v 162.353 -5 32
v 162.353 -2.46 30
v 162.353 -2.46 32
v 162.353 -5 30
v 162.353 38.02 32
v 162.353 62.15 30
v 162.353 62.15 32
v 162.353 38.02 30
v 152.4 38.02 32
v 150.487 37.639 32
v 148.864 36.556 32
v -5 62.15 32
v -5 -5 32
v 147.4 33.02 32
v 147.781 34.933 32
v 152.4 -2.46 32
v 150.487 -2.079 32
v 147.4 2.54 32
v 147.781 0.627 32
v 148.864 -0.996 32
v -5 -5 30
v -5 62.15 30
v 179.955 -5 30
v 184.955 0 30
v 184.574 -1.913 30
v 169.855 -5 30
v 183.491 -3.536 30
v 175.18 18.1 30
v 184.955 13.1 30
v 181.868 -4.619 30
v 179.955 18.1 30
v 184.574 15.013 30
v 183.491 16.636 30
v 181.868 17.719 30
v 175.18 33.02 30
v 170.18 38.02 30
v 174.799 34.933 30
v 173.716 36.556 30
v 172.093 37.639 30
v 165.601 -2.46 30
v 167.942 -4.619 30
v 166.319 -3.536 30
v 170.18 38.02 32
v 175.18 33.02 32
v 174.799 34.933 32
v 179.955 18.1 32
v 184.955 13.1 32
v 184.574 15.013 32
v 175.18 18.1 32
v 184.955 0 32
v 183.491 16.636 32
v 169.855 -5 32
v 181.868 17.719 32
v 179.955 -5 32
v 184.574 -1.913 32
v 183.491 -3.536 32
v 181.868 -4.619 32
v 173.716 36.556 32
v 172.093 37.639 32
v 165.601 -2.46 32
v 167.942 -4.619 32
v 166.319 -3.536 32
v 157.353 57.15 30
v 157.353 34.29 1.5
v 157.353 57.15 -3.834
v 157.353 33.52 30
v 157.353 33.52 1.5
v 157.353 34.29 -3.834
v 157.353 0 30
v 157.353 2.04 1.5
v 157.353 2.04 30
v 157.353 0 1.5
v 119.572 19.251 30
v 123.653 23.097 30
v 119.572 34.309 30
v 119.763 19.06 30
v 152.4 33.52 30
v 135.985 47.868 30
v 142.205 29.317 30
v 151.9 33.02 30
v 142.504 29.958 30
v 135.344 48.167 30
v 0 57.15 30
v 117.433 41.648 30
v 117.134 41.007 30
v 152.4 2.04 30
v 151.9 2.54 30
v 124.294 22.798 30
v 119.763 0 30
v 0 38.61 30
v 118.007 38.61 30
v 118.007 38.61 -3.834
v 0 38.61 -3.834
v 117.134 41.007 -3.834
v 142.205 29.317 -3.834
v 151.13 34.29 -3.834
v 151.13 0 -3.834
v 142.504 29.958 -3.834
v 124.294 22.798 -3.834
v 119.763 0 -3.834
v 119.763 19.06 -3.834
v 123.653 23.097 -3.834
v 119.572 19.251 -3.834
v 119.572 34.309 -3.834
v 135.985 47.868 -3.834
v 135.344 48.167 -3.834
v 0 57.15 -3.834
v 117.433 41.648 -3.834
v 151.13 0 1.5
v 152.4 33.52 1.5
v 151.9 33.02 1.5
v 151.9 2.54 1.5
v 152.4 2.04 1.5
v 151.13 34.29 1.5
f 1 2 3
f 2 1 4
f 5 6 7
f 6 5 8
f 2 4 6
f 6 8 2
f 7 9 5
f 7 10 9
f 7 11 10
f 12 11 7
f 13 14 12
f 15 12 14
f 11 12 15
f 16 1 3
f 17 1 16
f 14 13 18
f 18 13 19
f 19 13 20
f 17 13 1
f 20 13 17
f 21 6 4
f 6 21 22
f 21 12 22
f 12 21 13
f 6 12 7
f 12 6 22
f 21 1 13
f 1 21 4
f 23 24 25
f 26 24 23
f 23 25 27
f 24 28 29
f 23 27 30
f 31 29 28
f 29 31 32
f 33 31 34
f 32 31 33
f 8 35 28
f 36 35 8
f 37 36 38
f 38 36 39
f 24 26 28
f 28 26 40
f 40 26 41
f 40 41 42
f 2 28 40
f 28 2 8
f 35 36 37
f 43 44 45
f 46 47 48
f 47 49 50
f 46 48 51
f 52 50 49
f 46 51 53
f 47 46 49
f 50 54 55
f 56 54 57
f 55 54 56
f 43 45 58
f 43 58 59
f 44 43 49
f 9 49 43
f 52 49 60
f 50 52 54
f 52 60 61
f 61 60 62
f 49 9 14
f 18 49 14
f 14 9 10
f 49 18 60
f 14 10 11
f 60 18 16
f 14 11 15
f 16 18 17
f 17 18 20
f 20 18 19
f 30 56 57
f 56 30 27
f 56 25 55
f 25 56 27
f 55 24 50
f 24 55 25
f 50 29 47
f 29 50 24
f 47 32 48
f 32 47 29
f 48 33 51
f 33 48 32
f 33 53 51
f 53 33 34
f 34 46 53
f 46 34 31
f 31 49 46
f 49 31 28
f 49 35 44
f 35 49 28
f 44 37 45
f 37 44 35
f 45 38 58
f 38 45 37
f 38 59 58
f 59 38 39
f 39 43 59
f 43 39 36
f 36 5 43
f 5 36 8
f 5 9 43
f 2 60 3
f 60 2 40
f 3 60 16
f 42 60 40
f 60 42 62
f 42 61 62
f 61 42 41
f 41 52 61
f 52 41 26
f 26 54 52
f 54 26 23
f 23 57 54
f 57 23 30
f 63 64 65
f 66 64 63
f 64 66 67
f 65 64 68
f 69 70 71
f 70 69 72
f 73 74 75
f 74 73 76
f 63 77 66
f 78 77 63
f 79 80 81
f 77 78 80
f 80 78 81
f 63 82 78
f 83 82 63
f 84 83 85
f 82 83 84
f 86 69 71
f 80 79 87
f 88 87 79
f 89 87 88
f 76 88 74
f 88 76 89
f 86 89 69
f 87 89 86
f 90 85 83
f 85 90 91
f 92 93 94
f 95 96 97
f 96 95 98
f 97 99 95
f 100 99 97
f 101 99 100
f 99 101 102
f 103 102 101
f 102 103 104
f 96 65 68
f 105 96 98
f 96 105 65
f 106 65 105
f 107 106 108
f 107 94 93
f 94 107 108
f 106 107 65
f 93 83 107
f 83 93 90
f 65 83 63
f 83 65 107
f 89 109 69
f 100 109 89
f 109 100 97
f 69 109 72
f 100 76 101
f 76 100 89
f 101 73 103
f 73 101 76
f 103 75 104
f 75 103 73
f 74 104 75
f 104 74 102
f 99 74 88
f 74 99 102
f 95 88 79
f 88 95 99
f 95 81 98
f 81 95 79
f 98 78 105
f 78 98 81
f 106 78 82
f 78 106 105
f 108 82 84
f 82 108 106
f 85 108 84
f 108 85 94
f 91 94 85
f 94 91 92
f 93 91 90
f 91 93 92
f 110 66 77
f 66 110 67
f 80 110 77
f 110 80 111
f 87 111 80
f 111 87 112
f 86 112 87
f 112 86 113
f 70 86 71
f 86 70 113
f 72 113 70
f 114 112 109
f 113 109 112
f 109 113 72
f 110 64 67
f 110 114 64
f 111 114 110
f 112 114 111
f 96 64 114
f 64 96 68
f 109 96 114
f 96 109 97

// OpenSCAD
// file: ../../../lib/circuits/helpers.scad
function bu(u) = u * 2.54;

module breadboard_row(number, orientation="vertical") {
  children();
  if(number > 1) {
    if(orientation == "vertical") {
      translate([0,bu(1),0])
        breadboard_row(number-1, orientation=orientation) {
          children();
        }
    } else {
      translate([bu(1),0,0])
        breadboard_row(number-1, orientation=orientation){
          children();
        }
    }
  }
}
// file: ../../../lib/switches/rgb.scad
include <../variables.scad>

module rgb_row_trace_connection(width, height, xpos, ypos, rgb, connections) {
  half_width = u_mm(width)/2;
  half_height = u_mm(height)/2;
  if(connections[3] == "connect") {
    translate([1-half_width,8.875,0]){
      circle(d=0.8,$fn=40);
      offset(0.4)
        polygon(points=[[0,-0.01],[0,0.01],[u_mm(-xpos)-2, u_mm(-ypos)+0.01],[u_mm(-xpos)-2, u_mm(-ypos)-0.01]]);
    }
    translate([1-half_width,4.9,0]){
      circle(d=0.8,$fn=40);
      offset(0.4)
        polygon(points=[[0,-0.01],[0,0.01],[u_mm(-xpos)-2, u_mm(-ypos)+0.01],[u_mm(-xpos)-2, u_mm(-ypos)-0.01]]);
    }
    translate([1-half_width,3.3,0]){
      circle(d=0.8,$fn=40);
      offset(0.4)
        polygon(points=[[0,-0.01],[0,0.01],[u_mm(-xpos)-2, u_mm(-ypos)+0.01],[u_mm(-xpos)-2, u_mm(-ypos)-0.01]]);
    }
  }
  if(connections[2] == "connect") {
    translate([half_width-1,8.875,0]) {
      circle(d=0.8,$fn=40);
    }
    translate([half_width-1,4.9,0]) {
      circle(d=0.8,$fn=40);
    }
    translate([half_width-1,3.3,0]){
      circle(d=0.8,$fn=40);
    }
  }
}

module rgb_pcb_drill(width=1, height=1, rgb=true, connections=["hole","hole","hole","hole"]) {
  half_width = u_mm(width)/2;
  half_height = u_mm(height)/2;
  translate([half_width,half_height,0]) {
    if(rgb == true) {
      // LED Hole
      translate([-1.875,3.4])
        square([3.75,3]);

      // LED D
      if(connections[3] == "hole")
        translate([1.3-half_width,8,0])
          circle(d=1,$fn=40);
      if(connections[2] == "hole")
        translate([half_width-1.3,8,0])
          circle(d=1,$fn=40);

      // LED G
      if(connections[3] == "hole")
        translate([1.3-half_width,5.4,0])
          circle(d=1,$fn=40);
      if(connections[2] == "hole")
        translate([half_width-1.3,5.4,0])
          circle(d=1,$fn=40);

      // LED V
      if(connections[3] == "hole")
        translate([1.3-half_width,2.8,0])
          circle(d=1,$fn=40);
      if(connections[2] == "hole")
        translate([half_width-1.3,2.8,0])
          circle(d=1,$fn=40);
    }

    children();
  }
}

module rgb_pcb_hole_traces(width=1, height=1, rgb=true, xpos=0, ypos=0, connections=["hole","hole","hole","hole"]) {
  half_width = u_mm(width)/2;
  half_height = u_mm(height)/2;
  translate([half_width,half_height,0]) {
    if(rgb == true) {
      // LED D
      if(connections[3] == "hole")
        translate([1.3-half_width,8,0])
          circle(d=2.5,$fn=40);
      if(connections[2] == "hole")
        translate([half_width-1.3,8,0])
          circle(d=2.5,$fn=40);

      // LED G
      if(connections[3] == "hole")
        translate([1.3-half_width,5.4,0])
          circle(d=2.5,$fn=40);
      if(connections[2] == "hole")
        translate([half_width-1.3,5.4,0])
          circle(d=2.5,$fn=40);

      // LED V
      if(connections[3] == "hole")
        translate([1.3-half_width,2.8,0])
          circle(d=2.5,$fn=40);
      if(connections[2] == "hole")
        translate([half_width-1.3,2.8,0])
          circle(d=2.5,$fn=40);
    }

    children();
  }
}

module rgb_pcb_traces(width=1, height=1, rgb=true, xpos=0, ypos=0, connections=["hole","hole","hole","hole"]) {
  half_width = u_mm(width)/2;
  half_height = u_mm(height)/2;
  rgb_pcb_hole_traces(width=width, height=height, rgb=rgb, connections=connections) {
    if(rgb == true) {
      rgb_row_trace_connection(width=width, height=height, xpos=xpos, ypos=ypos, rgb=rgb, connections=connections);
      v_left = connections[3] == "none" ? 1 : half_width-5;
      // LED G
      translate([1.25,5])
        square([2,2]);
      translate([2.7,8.5,0]) {
        length = connections[2] == "none" ? 2 : half_width-3.7; 
        square([length,0.75]);
      }
      translate([2.7,6.8])
        square([0.8,2.4]);
      translate([-3.5,6.2])
        square([7,0.8]);
      translate([-3.5,6.8])
        square([0.8,2.4]);
      translate([-4-v_left,8.5,0])
        square([v_left+1,0.75]);

      // LED D
      translate([-4-v_left,4.5,0])
        square([v_left,0.8]);
      translate([-4.5,4.5,0])
        square([0.8,1.3]);
      translate([-4.5,5,0])
        square([1.3,0.8]);
      translate([2,4,0])
        square([2,0.8]);
      translate([4,4,0])
        square([0.8,1.3]);
      translate([4,4.5,0]) {
        length = connections[2] == "none" ? 0 : half_width-5; 
        square([length,0.75]);
      }
      translate([-3.375,5])
        square([2,1.1]);
      translate([1.25,3.75])
        square([2,1.1]);

      // LED V
      v_right = connections[2] == "none" ? 0 : half_width-5.25;
      translate([-4-v_left,2.9,0])
        square([v_right+v_left+8.875,0.8]);
      translate([-3.375,3.5])
        square([2,1.35]);
    }

    children();
  }
}
// file: ../../../lib/switches/base.scad
include <../variables.scad>
include <rgb.scad>

// ["top", "bottom", "left", "right"]

module switch_row_trace_connection(width, height, xpos, ypos, rgb, connections) {
  half_width = u_mm(width)/2;
  half_height = u_mm(height)/2;
  if(connections[3] == "connect") {
    translate([1-half_width,-5.5,0]){
      circle(d=0.8,$fn=40);
      offset(0.4)
        polygon(points=[[0,-0.01],[0,0.01],[u_mm(-xpos)-2, u_mm(-ypos)+0.01],[u_mm(-xpos)-2, u_mm(-ypos)-0.01]]);
    }
  }
  if(connections[2] == "connect") {
    translate([half_width-1,-5.5,0]) {
      circle(d=0.8,$fn=40);
    }
  }
}

module switch_column_trace_connection(width, height, xpos, ypos, rgb, connections, last_xpos=0, last_ypos=0) {
  half_width = u_mm(width)/2;
  half_height = u_mm(height)/2;
  if(connections[1] == "connect") {
    translate([-u_mm((width-1)/2)-0.9,half_height-1,0]) {
      circle(d=0.8,$fn=40);
      offset(0.4)
        polygon(points=[[0,-0.01],[0,0.01],[u_mm((width-1)/2),0.01],[u_mm((width-1)/2),-0.01]]);
    }
  }
  if(connections[0] == "connect") {
    y_off = u_mm(ypos-last_ypos);
    x_off = u_mm(last_xpos-xpos);
    translate([-0.875,-1-y_off-half_height,0]) {
      offset(0.4)
        polygon(points=[[-0.01+x_off,0],[0.01+x_off,0],[0.01,2+y_off],[-0.01,2+y_off]]);
      translate([x_off-0.01,0]) {
        offset(0.4)
          polygon(points=[[0,-0.01],[0,0.01],[u_mm((width-1)/2)+1,0.01],[u_mm((width-1)/2)+1,-0.01]]);
      }
    }
  }
}

module switch_base_pcb_drill(width=1, height=1, rgb=true, single=true, connections=["hole","hole","hole","hole"]) {
  half_width = u_mm(width)/2;
  half_height = u_mm(height)/2;
  rgb_pcb_drill(width=width, height=height, rgb=rgb, connections=connections) {
    // Row
    if(connections[2] == "hole")
      translate([half_width-1.3,-5.5,0])
        circle(d=1,$fn=40);
    if(connections[3] == "hole")
      translate([1.3-half_width,-5.5,0])
        circle(d=1,$fn=40);

    // Column
    if(connections[1] == "hole")
      translate([-1,half_height-1.25,0])
        circle(d=1,$fn=40);
    if(connections[0] == "hole")
      translate([-1,1.25-half_height,0])
        circle(d=1,$fn=40);

    children();
  }
}

module switch_base_pcb_traces(width=1, height=1, rgb=true, xpos=0, ypos=0, connections=["hole","hole","hole","hole"], last_xpos=0, last_ypos=0, single=true) {
  half_width = u_mm(width)/2;
  half_height = u_mm(height)/2;
  rgb_pcb_traces(width=width, height=height, rgb=rgb, xpos=xpos, ypos=ypos, connections=connections) {
    switch_row_trace_connection(width, height, xpos, ypos, rgb, connections);
    if(single && !rgb)
      switch_column_trace_connection(width, height, xpos, ypos, rgb, connections, last_xpos=last_xpos, last_ypos=last_ypos);

    // Row
    if(connections[2] == "hole")
      translate([half_width-1.3,-5.5,0])
        circle(d=2.5,$fn=40);
    if(connections[3] == "hole")
      translate([1.3-half_width,-5.5,0])
        circle(d=2.5,$fn=40);

    // Column
    if(connections[1] == "hole")
      translate([-1,half_height-1.25,0])
        circle(d=2.4,$fn=40);
    if(connections[0] == "hole")
      translate([-1,1.25-half_height,0])
        circle(d=2.4,$fn=40);

    children();
  }
}

module switch_base_pcb_traces_bottom(width=1, height=1, rgb=true, xpos=0, ypos=0, connections=["hole","hole","hole","hole"], last_xpos=0, last_ypos=0) {
  half_width = u_mm(width)/2;
  half_height = u_mm(height)/2;
  rgb_pcb_hole_traces(width=width, height=height, rgb=rgb, connections=connections) {
    switch_column_trace_connection(width, height, xpos, ypos, rgb, connections, last_xpos=last_xpos, last_ypos=last_ypos);

    // Row
    if(connections[2] == "hole")
      translate([half_width-1.3,-5.5,0])
        circle(d=2.5,$fn=40);
    if(connections[3] == "hole")
      translate([1.3-half_width,-5.5,0])
        circle(d=2.5,$fn=40);

    // Column
    if(connections[1] == "hole")
      translate([-1,half_height-1.25,0])
        circle(d=2.5,$fn=40);
    if(connections[0] == "hole")
      translate([-1,1.25-half_height,0])
        circle(d=2.5,$fn=40);

    children();
  }
}
// file: ../../../lib/switches/footprints.scad
include <../variables.scad>
include <stabilizers.scad>

module pcb_switch_outline(width=1, height=1) {
  stab_extra = width >= 2 ? 2 : 0;
  translate([0,-stab_extra])
    square([u_mm(width)+0.01, u_mm(height)+0.01+stab_extra]);
}

module pcb_switch_space_outline(width=1, height=1, style="mx", cnc=false) {
  offset = height_for_style(style);
  stab_extra = width >= 2 ? 2 : 0;
  translate([-1,-1-stab_extra,2.834-offset])
    cube([u_mm(width) + 2, u_mm(height) + 2 + stab_extra, 1.166+offset]);
  translate([u_mm(width/2),u_mm(height/2)]) {
    translate([-7.5,-7.5,1.5-offset])
      cube([15,15,5]);
    translate([-7,-7,-10])
      cube([14,14,10]);
    translate([u_mm(-width/2)-0.5,u_mm(-height/2)-0.5,-20-offset])
      cube([u_mm(width)+1,u_mm(height)+1, 20]);
  }
  translate([hole_offset(width), hole_offset(height),-10])
    stab(width);
}
// file: ../../../lib/switches/stabilizers.scad
module stab_hole_render(distance){
  translate([14+distance+3.375,6.99,0]) {
    circle(d=3.175, $fn=40);
    translate([0,-15.24,0])
      circle(d=4.064, $fn=40);
  }
  translate([-6.75-distance+3.375,6.99,0]) {
    circle(d=3.175, $fn=40);
    translate([0,-15.24,0])
      circle(d=4.064, $fn=40);
  }
}

module stab_holes(width) {
  if (width >= 7) {
    stab_hole_render(39.6);
  } else if (width >= 6) {
    stab_hole_render(39.6);
  } else if(width >= 2) {
    stab_hole_render(1.6);
  }
}

module stab_render(distance, cnc=false, height=5.334) {
  translate([14+distance,1.47,0]){
    // Right Side Large Hole
    cube([6.75,12.3,10]);

    // Add 1/16" corner holes for milling
    if(cnc){
      translate([0.56,0.56,0])
        cylinder(h=10,d=1.59,$fn=20);
      translate([6.75-0.56,0.56,0])
        cylinder(h=10,d=1.59,$fn=20);
      translate([0.56,12.3-0.56,0])
        cylinder(h=10,d=1.59,$fn=20);
      translate([6.75-0.56,12.3-0.56,0])
        cylinder(h=10,d=1.59,$fn=20);
    }
    translate([5.75,3.23,0]){
      // Side hole for notch
      cube([1.825,3.175,10]);
      translate([1.825,1.59,0])
        if(cnc)
          resize([1.59,3.175,10])
            cylinder(h=10,d=1.59,$fn=20);
    }
    translate([1.725,11.3,0]){
      // Top Notch
      cube([3.3,2.2,10]);
      if(cnc)
        translate([1.65,2.2,0])
          resize([3.3,1,10])
            cylinder(h=10,d=1,$fn=20);
    }
    // Thin out for clip
    translate([-1,-1,10-height+1.5])
      cube([8.75,14.3,height-1.5]);
  }
  translate([-6.75-distance,1.47,0]){
    // Left Side Large Hole
    cube([6.75,12.3,10]);
    translate([-0.825,3.23,0]){
      // Side hole for notch
      cube([1.825,3.175,10]);
      if(cnc)
        translate([0,1.59,0])
          resize([1.59,3.175,10])
            cylinder(h=10,d=1.59,$fn=20);

    }
    translate([1.725,11.3,0]){
      // Top Notch
      cube([3.3,2.2,10]);
      if(cnc)
        translate([1.65,2.2,0])
          resize([3.3,1,10])
            cylinder(h=10,d=1,$fn=20);
    }
    if(cnc){
      translate([0.56,0.56,0])
        cylinder(h=10,d=1.59,$fn=20);
      translate([6.75-0.56,0.56,0])
        cylinder(h=10,d=1.59,$fn=20);
      translate([0.56,12.3-0.56,0])
        cylinder(h=10,d=1.59,$fn=20);
      translate([6.75-0.56,12.3-0.56,0])
        cylinder(h=10,d=1.59,$fn=20);
    }
    // Thin out for clip
    translate([-1,-1,10-height+1.5])
      cube([8.75,14.3,height-1.5]);
  }
  // Center shaft for bar
  translate([-distance-2,4.7,0]){
    cube([distance*2+20,4.6,10]);
  }
}

module stab(key_width, cnc=false) {
  if (key_width >= 7) {
    stab_render(39.6, cnc=cnc);
  } else if (key_width >= 6) {
    stab_render(39.6, cnc=cnc);
  } else if(key_width >= 2) {
    stab_render(1.6, cnc=cnc);
  }
}
// file: ../../../lib/circuits/wire.scad
module guage(guage=12) {
  fn=20;
  if(guage == 8) {
    circle(d=3.25, $fn=fn);
  } else if (guage == 10) {
    circle(d=2.59, $fn=fn);
  } else if (guage == 12) {
    circle(d=2.06, $fn=fn);
  } else if (guage == 14) {
    circle(d=1.57, $fn=fn);
  } else if (guage == 16) {
    circle(d=1.3, $fn=fn);
  }
}

module wire_pcb_drill(guage=12) {
  offset(0.1)
    guage(guage);
}

module wire_pcb_traces(guage=12) {
  offset(0.75)
    guage(guage);
}

module wire_pcb_outline(guage=12) {
  offset(1.5)
    guage(guage);
}

module wire_space_outline(guage=12) {
  linear_extrude(10)
    offset(0.1)
      guage(guage);
}
// file: ../../../lib/circuits/trrs.scad
module trrs_post(d=1.2) {
  translate([0,-d/4,0]) {
    circle(d=d, $fn=20);
    translate([-d/2,0,0]) {
      square([d,(d/2-.2)]);
    }
    translate([0,(d/2-.2),0]) {
      circle(d=d, $fn=20);
    }
  }
}

module trrs_pcb_drill(side="left") {
  translate([2.8,1.5]) {
    circle(d=2, $fn=20);
  }
  translate([2.8,8.5]) {
    circle(d=2, $fn=20);
  }
  translate([0.5,11.3,0]) {
    trrs_post();
  }
  translate([5.1,3.2,0]) {
    trrs_post();
  }
  translate([5.1,6.2,0]) {
    trrs_post();
  }
  translate([5.1,10.2,0]) {
    trrs_post();
  }
  if(side != "none"){
    offset = side == "left" ? 7.6 : -2;
    translate([offset,11.3]) {
      circle(d=1.2, $fn=20);
    }
    translate([offset,8.3]) {
      circle(d=1.2, $fn=20);
    }
    translate([offset,5.3]) {
      circle(d=1.2, $fn=20);
    }
    translate([offset,2.2]) {
      circle(d=1.2, $fn=20);
    }
  }
}

module trrs_pcb_traces(side="left") {
  translate([-1,9.7,0]){
    difference() {
      square([3,3]);
      if(side == "right") {
        translate([3,-1.8]) {
          rotate(45) {
            square(2);
          }
        }
      }
    }
  }
  translate([3.6,1.2,0]){
    difference() {
      square([3,3.5]);
      if(side == "left") {
        translate([3,2.3]) {
          rotate(45) {
            square(2);
          }
        }
      }
    }
  }
  translate([3.6,4.8,0]){
    difference() {
        square([3,3.5]);
        if(side == "left") {
          translate([3,2.3]) {
            rotate(45) {
              square(2);
            }
          }
        }
    }
  }
  translate([3.6,8.4,0]){
    difference() {
      square([3,3.2]);
      if(side == "left") {
        translate([3,1.8]) {
          rotate(45) {
            square(2);
          }
        }
      }
    }
  }
  if(side != "none"){
    translate([side == "left" ? 7.6 : -2,0,0]){
      translate([0,11.3]) {
        circle(d=3, $fn=20);
      }
      translate([0,8.3]) {
        circle(d=2.9, $fn=20);
      }
      translate([0,5.3]) {
        circle(d=3, $fn=20);
      }
      translate([0,2.2]) {
        circle(d=3, $fn=20);
      }
    }
    translate([side == "left" ? 5.6 : -2,0,0]){
      left_trace = side == "left" ? 2.5 : 7.6;
      translate([0,2.2]) {
        square([left_trace,1.5]);
      }
      translate([0,5.1]) {
        square([left_trace,1.5]);
      }
      if(side == "left") {
        translate([0,8.7]) {
          square([left_trace,0.9]);
        }
      }
      else {
        translate([0,8]) {
          square([4,1.6]);
        }
        translate([4,9]) {
          square([4,1.6]);
        }
        translate([2.8,9.4]) {
          rotate(-45) {
            square([1,1.7]);
          }
        }
      }
    }
    translate([side == "left" ? 0.5 : -2,0,0]){
      right_trace = side == "left" ? 7.1 : 2;
      translate([0,11.7]) {
        square([right_trace,1.3]);
      }
      translate([0,12]) {
        circle(1, $fn=20);
      }
      translate([right_trace,11.8]) {
        circle(1, $fn=20);
      }
    }
  }
}

module trrs_pcb_outline(side="left") {
  translate([-1,0,0]) {
    square([7.6,13.1]);
  }
  if(side != "none"){
    translate([side == "left" ? 5.6 : -3.5, 0]) {
      square([4,13.1]);
    }
  }
}

module trrs_space_outline(side="left") {
  translate([0,0,-5.3]) {
    linear_extrude(7){
      translate([-2,-1,0])
        square([9.6,15.1]);
      translate([0,-12.1,0])
        square([5.6,12.1]);
      if(side != "none")
        translate([side == "left" ? 5.6 : -4.5, -1])
          square([5,15.1]);
    }
  }
  translate([3,-2,-2.6]) {
    rotate([90,0,0]) {
      cylinder(d=10, h=30, $fn=100);
    }
  }
}
// file: ../../../lib/circuits/trace.scad
function vdef(vector, index) = len(vector) == index ? vector[index-1] : vector[index];
function vadd(vector, index, axis) = vdef(vector, index)[axis] > vdef(vector, index-1)[axis] ? 0.01 : -0.01;
function polygon_from_vector(vector) = 
  len(vector) > 0 ?
    concat(vector, 
      [for (i = [1:len(vector)]) 
        [vector[len(vector)-i][0]-vadd(vector, i, 0),vector[len(vector)-i][1]-vadd(vector, i, 1)]])
      : [];

function parse_loc(loc) = [
  loc[5],
  len(loc) < 7 ? "both" : loc[6],
  len(loc) < 8 ? "none" : loc[7],
];

module manual_trace_pcb_drill(location) {
  vector = parse_loc(location)[0];
  echo("holes", parse_loc(location)[2]);
  if(parse_loc(location)[2] == "holes" || parse_loc(location)[2] == "hole_begin") {
    translate(vector[0]) {
      circle(d=1, $fn=20);
    }
  }
  if(parse_loc(location)[2] == "holes" || parse_loc(location)[2] == "hole_end") {
    translate(vector[len(vector)-1]) {
      circle(d=1, $fn=20);
    }
  }
}

module manual_trace_pcb_traces(location) {
  vector = parse_loc(location)[0];
  if(parse_loc(location)[1] != "bottom") {
    offset(0.4) {
      polygon(points=polygon_from_vector(vector));
    }
  }
  if(parse_loc(location)[2] == "holes" || parse_loc(location)[2] == "hole_begin") {
    translate(vector[0]) {
      circle(d=2.5, $fn=20);
    }
  }
  if(parse_loc(location)[2] == "holes" || parse_loc(location)[2] == "hole_end") {
    translate(vector[len(vector)-1]) {
      circle(d=2.5, $fn=20);
    }
  }
}

module manual_trace_pcb_traces_bottom(location) {
  vector = parse_loc(location)[0];
  if(parse_loc(location)[1] != "top") {
    offset(0.4) {
      polygon(points=polygon_from_vector(vector));
    }
  }
  if(parse_loc(location)[2] == "holes" || parse_loc(location)[2] == "hole_begin") {
    translate(vector[0]) {
      circle(d=2.5, $fn=20);
    }
  }
  if(parse_loc(location)[2] == "holes" || parse_loc(location)[2] == "hole_end") {
    translate(vector[len(vector)-1]) {
      circle(d=2.5, $fn=20);
    }
  }
}

module manual_trace_pcb_outline(location) {
  vector = parse_loc(location)[0];
  echo("location", location);
  offset(1)
    polygon(points=polygon_from_vector(vector));

  if(parse_loc(location)[2] == "holes" || parse_loc(location)[2] == "hole_begin") {
    translate(vector[0]) {
      circle(d=4, $fn=20);
    }
  }
  if(parse_loc(location)[2] == "holes" || parse_loc(location)[2] == "hole_end") {
    translate(vector[len(vector)-1]) {
      circle(d=4, $fn=20);
    }
  }
}

module manual_trace_space_outline(location) {
  vector = parse_loc(location)[0];
  translate([0,0,-1])
    linear_extrude(2)
      offset(0.5)
        manual_trace_pcb_outline(vector);
}
// file: ../../../lib/circuits/support.scad
module support_pcb_drill(mm=2) {
  offset(0.1)
    circle(d=mm, $fn=20);
}

module support_pcb_traces(mm=2) {
}

module support_pcb_outline(mm=2) {
  offset(2)
    circle(d=mm, $fn=20);
}

module support_space_outline(mm=2) {
  linear_extrude(10)
    offset(0.1)
      circle(d=mm, $fn=20);
}
// file: ../../../lib/circuits/proton_c.scad
use <helpers.scad>

module proton_c_pcb_drill(size="full") {
  translate([bu(0.5),bu(1.5),0]) {
    translate([0,bu(1)])
      breadboard_row(4, "horizontal"){
        circle(d=1, $fn=20);
        translate([0,bu(1)])
          circle(d=1, $fn=20);
      }
    translate([bu(4),bu(1)])
      breadboard_row(2)
        circle(d=1, $fn=20);
    translate([bu(4),bu(3)])
      breadboard_row(2)
        circle(d=1, $fn=20);
    circle(d=1, $fn=20);
    translate([bu(1),0,0])
      circle(d=1, $fn=20);
    translate([bu(5),0,0])
      circle(d=1, $fn=20);
    translate([bu(6),0,0])
      circle(d=1, $fn=20);
    breadboard_row(12) {
      circle(d=1, $fn=20);
      translate([bu(1),0,0])
        circle(d=1, $fn=20);
      translate([bu(5),0,0])
        circle(d=1, $fn=20);
      translate([bu(6),0,0])
        circle(d=1, $fn=20);
    }
    if(size == "full")
      translate([0,bu(13)])
        breadboard_row(6) {
          circle(d=1, $fn=20);
          translate([bu(1),0,0])
            circle(d=1, $fn=20);
          translate([bu(5),0,0])
            circle(d=1, $fn=20);
          translate([bu(6),0,0])
            circle(d=1, $fn=20);
    }
  }
}

module proton_c_pcb_traces(size="full") {
  translate([bu(0.5),bu(1.5),0]) {
    translate([0,bu(1)])
      breadboard_row(4, "horizontal"){
        circle(d=2.4, $fn=20);
        translate([-1,0])
          square([2,bu(1)]);
        translate([0,bu(1)])
          circle(d=2.4, $fn=20);
      }
    translate([0,bu(1)])
      breadboard_row(2) {
        translate([bu(5),0])
          circle(d=2.4, $fn=20);
        translate([bu(5),-1,0])
          square([bu(1),2]);
        translate([bu(6),0,0])
          circle(d=2.4, $fn=20);
      }
    translate([bu(4),bu(1)]){
      translate([-0.75,-1])
        square([1.5,bu(2)-2]);
      breadboard_row(2)
        circle(d=2.4, $fn=20);
      translate([0,-0.75])
        square([bu(2),1.5]);
    }
    translate([bu(4),bu(3)]){
      translate([-0.75,-1])
        square([1.5,bu(2)-2]);
      breadboard_row(2)
        circle(d=2.4, $fn=20);
      translate([0,-0.75])
        square([bu(2),1.5]);
    }
    circle(d=2.4, $fn=20);
    translate([0,-1,0])
      square([bu(1),2]);
    translate([bu(1),0,0])
      circle(d=2.4, $fn=20);
    translate([bu(5),0])
      circle(d=2.4, $fn=20);
    translate([bu(5),-1,0])
      square([bu(1),2]);
    translate([bu(6),0,0])
      circle(d=2.4, $fn=20);
    translate([0,bu(3)])
      breadboard_row(9) {
        circle(d=2.4, $fn=20);
        translate([0,-1,0])
          square([bu(1),2]);
        translate([bu(1),0,0])
          circle(d=2.4, $fn=20);
        translate([bu(5),0])
          circle(d=2.4, $fn=20);
        translate([bu(5),-1,0])
          square([bu(1),2]);
        translate([bu(6),0,0])
          circle(d=2.4, $fn=20);
      }
    if(size == "full")
      translate([0,bu(13)])
        breadboard_row(6) {
          circle(d=2.4, $fn=20);
          translate([0,-1,0])
            square([bu(1),2]);
          translate([bu(1),0,0])
            circle(d=2.4, $fn=20);
          translate([bu(5),0])
            circle(d=2.4, $fn=20);
          translate([bu(5),-1,0])
            square([bu(1),2]);
          translate([bu(6),0,0])
            circle(d=2.4, $fn=20);
        }
  }
}

module proton_c_pcb_outline(size="full") {
  translate([0,bu(1)])
  square([bu(7), bu(size == "full" ? 19 : 12)]);
}

module proton_c_space_outline(size="full") {
  translate([0,0,-4]) {
    linear_extrude(6) {
      translate([-bu(0.5),-bu(0.5)])
        square([bu(8), bu(size == "full" ? 21 : 14)]);
    }
    linear_extrude(5) {
      translate([bu(0.5),-bu(15),0])
        square([bu(6),bu(25)]);
    }
  }
}
// file: ../../../lib/circuits/pro_micro.scad
use <helpers.scad>

module pro_micro_pcb_drill(connections="holes") {
  translate([bu(0.5),bu(1.5),0]) {
    if(connections == "holes"){
      translate([bu(3),bu(1)])
        breadboard_row(3)
          circle(d=1, $fn=20);
      translate([bu(4),bu(3)])
        breadboard_row(3)
          circle(d=1, $fn=20);
    }
    breadboard_row(12) {
      circle(d=1, $fn=20);
      if(connections == "holes") {
        translate([bu(1),0,0])
          circle(d=1, $fn=20);
        translate([bu(5),0,0])
          circle(d=1, $fn=20);
      }
      translate([bu(6),0,0])
        circle(d=1, $fn=20);
    }
  }
}

module pro_micro_pcb_traces(connections="holes") {
  translate([bu(0.5),bu(1.5),0]) {
    // GRND
    if(connections == "holes"){
      translate([bu(3),bu(1)]){
        translate([-0.75,-1])
          square([1.5,bu(3)-2]);
        breadboard_row(3)
          circle(d=2.4, $fn=20);
        translate([0,-0.75])
          square([bu(2),1.5]);
      }
      translate([bu(4),bu(3)]){
        translate([-0.75,-1])
          square([1.5,bu(3)-2]);
        breadboard_row(3)
          circle(d=2.4, $fn=20);
        translate([0,-0.75])
          square([bu(2),1.5]);
      }
    }
    breadboard_row(12) {
      circle(d=2.4, $fn=20);
      if(connections == "holes") {
        translate([0,-1,0])
          square([bu(1),2]);
        translate([bu(1),0,0])
          circle(d=2.4, $fn=20);
        translate([bu(5),0])  
          circle(d=2.4, $fn=20);
        translate([bu(5),-1,0])
          square([bu(1),2]);
      }
      translate([bu(6),0,0])
        circle(d=2.4, $fn=20);
    }
  }
}

module pro_micro_pcb_outline() {
  translate([0,bu(1)])
  square([bu(7), bu(12)]);
}

module pro_micro_space_outline() {
  translate([0,0,-4]) {
    linear_extrude(6) {
      translate([-bu(0.5),-bu(0.5)])
        square([bu(8), bu(14)]);
    }
    linear_extrude(5) {
      translate([bu(0.5),-bu(15),0])
        square([bu(6),bu(25)]);
    }
  }
}
// file: ../../../lib/circuits/mts_101.scad
use <../variables.scad>
module mts_101_pcb_drill() {
  translate([0,1.25]) {
    translate([2.5,0])
      square([3,1]);
    translate([1.25,0.5])
      circle(d=1,$fn=40);
    translate([6.75,0.5])
      circle(d=1,$fn=40);

    translate([2.5,4.75])
      square([3,1]);
    translate([1.25,5.25])
      circle(d=1,$fn=40);
    translate([6.75,5.25])
      circle(d=1,$fn=40);

    translate([4,10])
      circle(d=1,$fn=40);
    translate([1.25,10])
      circle(d=1,$fn=40);
    translate([6.75,10])
      circle(d=1,$fn=40);
  }
}

module mts_101_pcb_traces() {
  translate([0,1.25]) {
    translate([2,-0.5])
      square([4,2]);
    translate([1.25,0.5])
      circle(d=2,$fn=40);
    translate([6.75,0.5])
      circle(d=2,$fn=40);

    translate([2,4.25])
      square([4,2]);
    translate([1.25,5.25])
      circle(d=2,$fn=40);
    translate([6.75,5.25])
      circle(d=2,$fn=40);

    translate([4,10])
      circle(d=2,$fn=40);
    translate([1.25,9.5])
      square([6,1]);
    translate([1.25,10])
      circle(d=2,$fn=40);
    translate([6.75,10])
      circle(d=2,$fn=40);
  }
}

module mts_101_pcb_outline() {
  square([8,13]);
}

module mts_101_space_outline(, cnc=false) {
  translate([-0.5,-0.5,-10])
    cube([9,14, 14.4]);
  translate([4,6.5,-26]) {
    cylinder(d=6, h=18, $fn=30);
    cylinder(d=12, h=10, $fn=60);
  }
}
// file: ../../../lib/circuits/ec11.scad
use <../variables.scad>
use <../switches/base.scad>

module 1u_centered() {
  translate([u_mm(0.5),u_mm(0.5)])
    children();
}

module ec11_pcb_drill(single=false, connections=["hole","hole","hole","hole"]) {
  switch_base_pcb_drill(rgb=false, connections=connections) {
    // Key Column
    translate([-3,0,0])
      circle(d=1,$fn=40);

    // Key Row
    translate([7,2.5])
      circle(d=1, $fn=20);

    if(single) {
      translate([4.25,-3,0])
        circle(d=1, $fn=20);
      translate([-3,-3.25,0])
        circle(d=1,$fn=40);
    }
    translate([4.25,0,0])
      circle(d=1, $fn=20);

    translate([7,-2.5])
      circle(d=1, $fn=20);

    if(connections[3] == "hole"){
      translate([-5.5,2.5])
        circle(d=1, $fn=20);
      translate([-5.5,0])
        circle(d=1, $fn=20);
      translate([-5.5,-2.5])
        circle(d=1, $fn=20);
    }
    translate([-7.5,-2.5])
      circle(d=1, $fn=20);
    translate([-7.5,2.5])
      circle(d=1, $fn=20);
    translate([-7.5,0])
      circle(d=1, $fn=20);

    translate([-1.3,-6.25])
      square([2.6,1.5]);
    translate([-1.3,4.75])
      square([2.6,1.5]);
  }
}

module ec11_pcb_traces(single=false, connections=["hole","hole","hole","hole"]) {
  switch_base_pcb_traces(single=single, rgb=false, connections=connections) {
    // Key Row
    if(single){
      translate([2,2.2])
        square([4.5,0.8]);
      r_len = connections[0] != "none" ? u_mm(0.5)-1 : 6;
      l_len = connections[1] != "none" ? u_mm(0.5)-1 : 6;
      translate([2,-r_len])
        square([0.8,r_len+l_len]);
      if(connections[0] != "none")
        translate([-2,1-u_mm(0.5)])
          square([4,0.8]);
      if(connections[1] != "none")
        translate([-2.1,u_mm(0.5)-1.6])
          square([4.9,0.8]);
    }
    translate([7,2.5])
      circle(d=2.5,$fn=40);

    // Key Column
    if(connections[3] != "none")
      translate([1-u_mm(0.5),-6])
        square([u_mm(0.5)-4,1]);
    translate([-3.25,-6])
      square([0.8,5]);
    translate([-3,0])
      circle(d=2.5,$fn=40);

    if(single){
      translate([-3,-3.25])
        circle(d=2.5,$fn=40);
      translate([4.25,-3])
        circle(d=2.5,$fn=40);
    } else {
      translate([-3,-3.25])
        square([7.8,0.8]);
    }

    translate([7,-2.5])
      circle(d=2.5,$fn=40);
    translate([4.25,0]) {
      circle(d=2.5,$fn=40);
      rotate(-45)
        square([5,0.8]);
    }

    translate([4,-6])
      square([0.8,3]);
    if(connections[2] != "none")
      translate([4,-6])
        square([4.5,0.8]);

    if(connections[3] == "hole"){
      translate([-5.5,2.5])
        circle(d=2.25, $fn=20);
      translate([-5.5,0])
        circle(d=2.25, $fn=20);
      translate([-5.5,-2.5])
        circle(d=2.25, $fn=20);
    }
    translate([-7.5,-2.5])
      circle(d=2.25, $fn=20);
    translate([-7.5,2.5])
      circle(d=2.25, $fn=20);
    translate([-7.5,0])
      circle(d=2.25, $fn=20);
  }
}

module ec11_pcb_traces_bottom(connections=["hole","hole","hole","hole"]) {
  switch_base_pcb_traces_bottom(rgb=false, connections=connections) {
    // Key Row
    translate([2,2.2])
      square([4.5,0.8]);
    r_len = connections[0] != "none" ? u_mm(0.5)-1 : 6;
    l_len = connections[1] != "none" ? u_mm(0.5)-1 : 6;
    translate([2,-r_len])
      square([0.8,r_len+l_len]);
    
    if(connections[0] != "none")
      translate([-1.3,1-u_mm(0.5)])
        square([4,0.8]);
    if(connections[1] != "none")
      translate([-1,u_mm(0.5)-1.4])
        square([3.8,0.8]);
    translate([7,2.5])
      circle(d=2.5,$fn=40);

    // Key Column
    translate([-3,0])
      circle(d=2.5,$fn=40);

    translate([7,-2.5])
      circle(d=2.5,$fn=40);
    translate([4.25,0]) {
      circle(d=2.5,$fn=40);
    }

    if(connections[3] == "hole"){
      translate([-5.5,2.5])
        circle(d=2.25, $fn=20);
      translate([-5.5,0])
        circle(d=2.25, $fn=20);
      translate([-5.5,-2.5])
        circle(d=2.25, $fn=20);
    }
    translate([-7.5,-2.5])
      circle(d=2.25, $fn=20);
    translate([-7.5,2.5])
      circle(d=2.25, $fn=20);
    translate([-7.5,0])
      circle(d=2.25, $fn=20);
  }
}

module ec11_pcb_outline() {
  square([u_mm(1), u_mm(1)]);
}

module ec11_space_outline() {
  translate([-0.5,-0.5, -6])
    cube([u_mm(1)+1, u_mm(1)+1, 8]);
  1u_centered() {
    translate([0,0,-15])
      linear_extrude(15)
        circle(d=7, $fn=30);
    translate([0,0,-25])
      linear_extrude(15)
        circle(d=19, $fn=80);
  }
}
// file: ../../../lib/switches/choc_v1.scad
include <../variables.scad>
include <stabilizers.scad>
include <footprints.scad>

module switch_choc_v1_pcb_drill(width=1, height=1) {
  half_width = u_mm(width)/2;
  half_height = u_mm(height)/2;
  translate([half_width,half_height,0]) {
    circle(d=3.5, $fn=30);

    translate([-5.5,0])
      circle(d=2, $fn=30);
    translate([3,3.8])
      circle(d=1, $fn=30);
    translate([-4, 3.8])
      circle(d=1, $fn=30);
    translate([-4,1.25-half_height])
      circle(d=1, $fn=30);
    translate([-4, half_height-3])
      circle(d=1, $fn=30);

    translate([5.5,0])
      circle(d=2, $fn=30);
    translate([0,5.9])
      circle(d=1.3, $fn=30);
    translate([5,3.8])
      circle(d=1.3, $fn=30);
    translate([1-half_width, half_height-1])
      circle(d=1, $fn=30);
    translate([half_width-1, half_height-1])
      circle(d=1, $fn=30);
  }
}

module switch_choc_v1_pcb_traces(width=1, height=1) {
  half_width = u_mm(width)/2;
  half_height = u_mm(height)/2;
  translate([half_width,half_height,0]) {
    translate([5,3.8])
      circle(d=2.8, $fn=30);
    translate([3,3.8])
      circle(d=2.5, $fn=30);
    translate([-4, 3.8])
      circle(d=2.5, $fn=30);
    translate([-4.5, 2-half_height])
      square([1, u_mm(height)-4]);
    translate([-4,1.25-half_height])
      circle(d=2.5, $fn=30);
    translate([-4, half_height-3])
      circle(d=2.5, $fn=30);

    translate([0,5.9])
      circle(d=2.8, $fn=30);
    translate([-0.5, 5.9])
      square([1, half_height-6.9]);
    translate([1-half_width, half_height-1.5])
      square([half_width*2-2, 1]);
    translate([1-half_width, half_height-1])
      circle(d=2.5, $fn=30);
    translate([half_width-1, half_height-1])
      circle(d=2.5, $fn=30);
  }
}

module switch_choc_v1_pcb_outline(width=1, height=1) {
  pcb_switch_outline(width=width, height=height);
}
// file: ../../../lib/switches/mx.scad
include <../variables.scad>
include <stabilizers.scad>
include <footprints.scad>
include <base.scad>
include <rgb.scad>

module switch_mx_pcb_drill(width=1, height=1, rgb=true, single=true, connections=["hole","hole","hole","hole"]) {
  half_width = u_mm(width)/2;
  half_height = u_mm(height)/2;
  translate([hole_offset(width), half_height]) {
    stab_holes(width);
  }

  switch_base_pcb_drill(width=width, height=height, single=single, rgb=rgb, connections=connections) {
    circle(d=4,$fn=40);
    translate([-3.8,-2.5,0])
      circle(d=1.7,$fn=40);
    translate([2.5,-5,0])
      circle(d=1.7,$fn=40);
    translate([5,0,0])
      circle(d=1.75,$fn=40);
    translate([-5,0,0])
      circle(d=1.75,$fn=40);

    // Column
    translate([-1.2,-3,0])
      circle(d=1,$fn=40);
    translate([5,-2,0])
      circle(d=1,$fn=40);
    if(single){
      translate([6,-3.7,0])
        circle(d=1,$fn=40);
      if(rgb) {
        translate([5,1.7,0])
          circle(d=1,$fn=40);
      } else {
        translate([6,-8.3,0])
          circle(d=1,$fn=40);
      }
    }
  }
}

module switch_mx_pcb_traces(width=1, height=1, rgb=true, single=true, xpos=0, ypos=0, connections=["hole","hole","hole","hole"], last_xpos=0, last_ypos=0) {
  half_width = u_mm(width)/2;
  half_height = u_mm(height)/2;
  switch_base_pcb_traces(width=width, height=height, rgb=rgb, xpos=xpos, ypos=ypos, connections=connections, last_xpos=last_xpos, last_ypos=last_ypos, single=single) {
    translate([-3.8,-2.5,0])
      circle(d=4,$fn=40);
    translate([2.5,-5,0])
      circle(d=4,$fn=40);

    // Row
    v_left = connections[3] == "none" ? 1 : half_width;
    v_right = connections[2] == "none" ? 1 : half_width-5;
    translate([1-v_left,-5.9,0])
      square([v_left+v_right+3,0.8]);

    // Column
    translate([-1.2,-3,0])
      circle(d=2.5,$fn=40);
    translate([5,-2,0])
      circle(d=2.5,$fn=40);
    if(single){
      translate([6,-3.7,0])
        circle(d=2.5,$fn=40);
      difference() {
        translate([5,0,0])
          circle(d=3.55,$fn=40);
        translate([5,-2,0])
          square(4);
      }
      if(rgb) {
        translate([5,1.7,0])
          circle(d=2.3,$fn=40);
      } else {
        translate([4.2,1])
          square([0.8, half_height-2]);
        translate([-1,half_height-1.5])
          square([6,0.8]);
        translate([6,-8.3,0])
          circle(d=2.5,$fn=40);
        translate([-1.3,-8.7,0])
          square([7,0.8]);
      }
    }
  }
}

module switch_mx_pcb_traces_bottom(width=1, height=1, rgb=true, xpos=0, ypos=0, connections=["hole","hole","hole","hole"], last_xpos=0, last_ypos=0) {
  half_width = u_mm(width)/2;
  half_height = u_mm(height)/2;
  switch_base_pcb_traces_bottom(width=width, height=height, rgb=rgb, xpos=xpos, ypos=ypos, connections=connections, last_xpos=last_xpos, last_ypos=last_ypos) {
    translate([-3.8,-2.5,0])
      circle(d=4,$fn=40);
    translate([2.5,-5,0])
      circle(d=4,$fn=40);

    // Column
    translate([-1.2,-3,0])
      circle(d=2.5,$fn=40);
    translate([5,-2,0])
      circle(d=2.5,$fn=40);
    difference(){
      translate([2.5,-5,0])
        circle(d=5.9,$fn=40);
      translate([2.5,-5,0])
        circle(d=4.1,$fn=40);
      translate([0.3,-7,0])
        rotate(45)
          square(6);
    }
    translate([3.85,-3.45])
      square([0.8, 1]);

    t_height = connections[0] == "none" ? 1 : half_height-7.8;
    echo("h", 2-half_height, t_height);
    translate([-1.3,-t_height-6.8])
      square([0.8, t_height]);
    translate([-1.3,-7.2])
      square([2.2,0.8]);
    difference() {
      translate([5,0,0])
        circle(d=3.35,$fn=40);
      translate([5,-2,0])
        square(4);
    }
    b_height = connections[1] == "none" ? 2 : half_height-2;
    translate([4.2,1])
      square([0.8, b_height]);
    if(connections[1] != "none")
      translate([-1,half_height-1.5])
        square([6,0.8]);
  }
}

module switch_mx_pcb_outline(width=1, height=1) {
  pcb_switch_outline(width=width, height=height);
}
// file: ../../../lib/utilities.scad
function reverse(list) = len(list) > 0 ? [for (i = [1:len(list)]) list[len(list)-i]] : [];
function pop(list) = len(list) > 0 ? [for (i = [0:len(list)-1]) if (i != 0) list[i]] : [];
// file: ../../../lib/switches.scad
use <utilities.scad>
include <switches/mx.scad>
include <switches/choc_v1.scad>

module rotate_translate(rotation, xpos, ypos) {
  if(rotation[0] == undef || rotation[0] == 0) {
    translate([u_mm(xpos), u_mm(ypos), 0]) {
      children();
    }
  } else {
    xoff = rotation[1] == undef ? 0 : rotation[1];
    yoff = rotation[2] == undef ? 0 : rotation[2];
    angle = rotation[0] == undef ? 0 : rotation[0];
    translate([u_mm(xpos - xoff), u_mm(ypos - yoff), 0])
      rotate(angle)
        translate([u_mm(xoff), u_mm(yoff), 0])
          children();
  }
}

module switch(type, style="mx", rgb=true, xpos=0, ypos=0, width=1, cnc=false, rotation=[0,0,0], connections=["hole","hole","hole","hole"], last_xpos=0, last_ypos=0) {
  rotate_translate(rotation, xpos, ypos) {
    if(type == "outline")
      pcb_switch_outline(width=width);
    if(style == "mx") {
      if(type == "key")
        pcb_switch_space_outline(width=width, cnc=cnc, style="mx");
      if(type == "traces")
        switch_mx_pcb_traces(width=width, rgb=rgb, xpos=xpos, ypos=ypos, connections=connections, last_xpos=last_xpos, last_ypos=last_ypos);
      if(type == "traces_top")
        switch_mx_pcb_traces(width=width, single=false, rgb=rgb, xpos=xpos, ypos=ypos, connections=connections, last_xpos=last_xpos, last_ypos=last_ypos);
      if(type == "traces_bottom")
        switch_mx_pcb_traces_bottom(width=width, rgb=rgb, xpos=xpos, ypos=ypos, connections=connections, last_xpos=last_xpos, last_ypos=last_ypos);
      if(type == "drill")
        switch_mx_pcb_drill(width=width, rgb=rgb, connections=connections);
      if(type == "drill_double")
        switch_mx_pcb_drill(width=width, single=false, rgb=rgb, connections=connections);
    }

    if(style == "choc_v1") {
      if(type == "key")
        pcb_switch_space_outline(width=width, cnc=cnc, style="choc_v1");
      if(type == "traces")
        switch_choc_v1_pcb_traces(width=width);
      if(type == "traces_top")
        switch_choc_v1_pcb_traces(width=width);
      if(type == "traces_bottom")
        assert(false, "traces_bottom is incompatible with choc_v1");
      if(type == "drill")
        switch_choc_v1_pcb_drill(width=width);
      if(type == "drill_double")
        switch_choc_v1_pcb_drill(width=width, single=false);
    }

    if(style == "redragon") {
      if(type == "key")
        pcb_switch_space_outline(width=width, cnc=cnc, style="redragon");
      if(type == "traces")
        switch_mx_pcb_traces(width=width, rgb=rgb);
      if(type == "traces_top")
        switch_mx_pcb_traces(width=width, single=false, rgb=rgb);
      if(type == "traces_bottom")
        switch_mx_pcb_traces_bottom(width=width, rgb=rgb);
      if(type == "traces")
        switch_mx_pcb_traces(width=width, rgb=rgb);
      if(type == "drill")
        switch_mx_pcb_drill(width=width);
      if(type == "drill_double")
        switch_mx_pcb_drill(width=width, single=false);
    }
  }
}

module switch_row(keys, style="mx", rgb=true, margin=5, thickness=10, depth=0, cnc=false, type="key", last_row=[], last_xpos=0, previous_xpos=0, last_ypos=0, previous_ypos=0) {
  width = keys[0][0] == undef ? 1 : keys[0][0];
  xpos = keys[0][1] == undef ? 0 : keys[0][1];
  ypos = keys[0][2] == undef ? 0 : keys[0][2];
  rotation = keys[0][3] == undef ? [0,0,0] : keys[0][3];
  connections = keys[0][4] == undef ? ["hole","hole","hole","hole"] : keys[0][4];
  last_ypos = last_row[0][2] == undef ? last_ypos - previous_ypos : last_row[0][2]+last_ypos - previous_ypos;
  last_xpos = last_row[0][1] == undef ? last_xpos - previous_xpos : last_row[0][1]+last_xpos - previous_xpos;
  switch(type, style=style, rgb=rgb, xpos=xpos, ypos=ypos, width=width, cnc=cnc, rotation=rotation, connections=connections, last_xpos=last_xpos, last_ypos=last_ypos);
  if(len(keys) > 1) {
    translate([xpos*key_size+width*key_size, ypos*key_size, 0])
      switch_row(pop(keys), style=style, rgb=rgb, margin=margin, thickness=thickness, depth=depth, cnc=cnc, type=type, last_row = pop(last_row), last_xpos=last_xpos, previous_xpos=xpos, last_ypos=last_ypos, previous_ypos=ypos);
  }
}

module switches(switches, style="mx", rgb=true, margin=5, thickness=10, depth=0, cnc=false, type="key", last_row=[]) {
  if(len(switches) != 0) {
    switch_row(switches[0], style=style, rgb=rgb, margin=margin, thickness=thickness, depth=depth, cnc=cnc, type=type, last_row=last_row);
    if(len(switches) > 1) {
      last_row = switches[0];
      translate([0, key_size, 0])
        switches(pop(switches), style=style, rgb=rgb, margin=margin, depth=depth, thickness=thickness, cnc=cnc, type=type, last_row=last_row);
    }
  }
}
// file: ../../../lib/case.scad
include <variables.scad>
use <utilities.scad>
use <circuits.scad>

function key_width(key) = (key[0] == undef ? 1 : key[0]) + (key[1] == undef ? 0 : key[1]);
function width_row(row) = len(row) == 0 ? 0 : key_width(row[0]) + width_row(pop(row));
function width_board(rows) = len(rows) == 0 ? 0 : (
  let (current = width_row(rows[0]))
  let (next = width_board(pop(rows)))
    current > next ? current : next);

function key_height(key) = (key[2] == undef ? 0 : key[2]);
function height_row(row) = len(row) == 0 ? [0,0] : (
  let(other_rows = height_row(pop(row)))
  let(current = key_height(row[0]) + other_rows[0])
  let(maximum = current > other_rows[1] ? current : other_rows[1])
  [current, maximum]);
function height_board_rec(rows) = len(rows) == 0 ? 0 : (
  let (current = height_row(reverse(rows[0]))[1])
  let (next = height_board_rec(pop(rows)))
    current > next ? current : next);
function height_board(rows) = 
  let (height_rec = height_board_rec(rows))
    len(rows) + (height_rec > 0 ? height_rec : 0);

module case(rows, style="mx", margin=5, thickness=5, depth=0, radius=2, rest=0, circuits=[], _inherit_children="unset") {
  total_thickness = thickness + depth + height_for_style(style);
  z_offset = depth + height_for_style(style);
  if($children != 0 && (_inherit_children == "unset" || _inherit_children > 0)) {
    translate([0, 0, -z_offset])
      linear_extrude(total_thickness)
        offset(margin)
          children();
  } else {
    width=u_mm(width_board(rows))+margin*2;
    height=u_mm(height_board(rows))+margin*2+rest;
    translate([-margin, -margin, -z_offset]){
      translate([radius, 0, 0])
        cube([width-radius*2, height,total_thickness]);
      translate([0, radius, 0])
        cube([width, height-radius*2,total_thickness]);
      translate([radius, radius, 0])
        cylinder(total_thickness,radius,radius, $fn=60);
      translate([width-radius, radius, 0])
        cylinder(total_thickness,radius,radius, $fn=60);
      translate([width-radius, height-radius, 0])
        cylinder(total_thickness,radius,radius, $fn=60);
      translate([radius, height-radius, 0])
        cylinder(total_thickness,radius,radius, $fn=60);
    }
    if(len(circuits) > 0)
      translate([0, 0, -z_offset])
        linear_extrude(total_thickness)
          offset(margin)
            circuits_pcb_outline(circuits);
  }
}
// file: ../../../lib/variables.scad
key_size=19.05;
hole=14;

function u_mm(u) = u*key_size;
function hole_offset(u) = (key_size-hole)/2+u_mm(u-1)/2;

// This is used to determine how much space is between the top
// of the plate and the PCB.
function height_for_style(style) = style == "mx"        ? 5.334 :
                                   style == "redragon" ? 3.75  :
                                   style == "choc_v1"   ? 2.2   :  "invalid style";
// file: base.scad
function circuit() = [[8,0,0,0,"pro_micro"],[9.1,0,0,0,"trrs_right"],];

function layout() = [
  [[6.26], [1,1,1,[20,1,2]]],
  [[2.25],[1.75],[1.25],[]]
];

include <../../../keyboard.scad>
// main file
use <base.scad>

bottom_case(layout(), thickness=30, circuits=circuit());
